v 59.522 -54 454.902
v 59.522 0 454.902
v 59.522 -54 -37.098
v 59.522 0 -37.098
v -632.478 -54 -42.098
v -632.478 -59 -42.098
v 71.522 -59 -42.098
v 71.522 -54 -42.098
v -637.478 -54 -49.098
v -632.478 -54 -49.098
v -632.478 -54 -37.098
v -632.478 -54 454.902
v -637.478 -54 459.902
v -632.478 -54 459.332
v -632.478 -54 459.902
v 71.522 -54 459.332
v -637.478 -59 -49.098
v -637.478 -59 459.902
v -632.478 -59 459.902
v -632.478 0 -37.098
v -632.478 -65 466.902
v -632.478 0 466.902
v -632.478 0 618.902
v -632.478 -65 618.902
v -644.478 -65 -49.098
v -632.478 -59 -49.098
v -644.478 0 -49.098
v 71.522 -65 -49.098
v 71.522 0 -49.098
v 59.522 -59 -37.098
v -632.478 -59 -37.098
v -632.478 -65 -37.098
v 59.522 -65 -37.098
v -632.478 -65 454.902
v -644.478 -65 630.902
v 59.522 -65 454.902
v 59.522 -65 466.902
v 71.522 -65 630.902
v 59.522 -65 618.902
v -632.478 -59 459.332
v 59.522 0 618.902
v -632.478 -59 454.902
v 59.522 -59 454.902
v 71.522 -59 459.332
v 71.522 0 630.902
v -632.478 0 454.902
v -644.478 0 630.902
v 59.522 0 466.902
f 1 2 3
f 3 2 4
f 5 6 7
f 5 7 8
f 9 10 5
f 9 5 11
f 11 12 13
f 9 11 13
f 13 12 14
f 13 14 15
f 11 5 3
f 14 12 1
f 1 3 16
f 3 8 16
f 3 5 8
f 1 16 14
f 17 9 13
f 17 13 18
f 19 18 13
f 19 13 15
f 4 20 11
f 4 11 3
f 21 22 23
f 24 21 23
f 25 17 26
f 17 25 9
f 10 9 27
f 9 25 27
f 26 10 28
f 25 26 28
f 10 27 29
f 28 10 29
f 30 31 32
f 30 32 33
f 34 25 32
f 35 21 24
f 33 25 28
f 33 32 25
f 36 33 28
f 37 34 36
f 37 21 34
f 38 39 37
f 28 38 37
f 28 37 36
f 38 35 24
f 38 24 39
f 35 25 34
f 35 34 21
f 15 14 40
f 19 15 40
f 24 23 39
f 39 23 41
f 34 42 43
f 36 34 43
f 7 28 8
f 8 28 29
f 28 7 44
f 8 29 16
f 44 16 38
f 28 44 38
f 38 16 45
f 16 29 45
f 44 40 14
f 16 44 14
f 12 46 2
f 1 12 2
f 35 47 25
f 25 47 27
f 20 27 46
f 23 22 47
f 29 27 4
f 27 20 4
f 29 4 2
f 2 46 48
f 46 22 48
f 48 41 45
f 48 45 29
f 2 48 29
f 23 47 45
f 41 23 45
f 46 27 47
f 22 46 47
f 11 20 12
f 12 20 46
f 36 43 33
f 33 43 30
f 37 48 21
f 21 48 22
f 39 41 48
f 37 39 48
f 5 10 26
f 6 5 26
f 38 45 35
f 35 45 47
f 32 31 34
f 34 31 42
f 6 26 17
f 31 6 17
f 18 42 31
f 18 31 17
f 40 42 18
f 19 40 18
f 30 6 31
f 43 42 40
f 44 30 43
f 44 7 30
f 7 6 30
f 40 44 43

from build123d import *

# Parameters (mm, degrees)
F0_W     = 692
F0_H     = 12
F1_DEPTH = 65
F2_W     = 5
F2_H     = 5
F3_DEPTH = 709
F4_W     = 5
F4_H     = 4.429847
F5_DEPTH = 709
F6_W     = 5
F6_H     = 5
F7_DEPTH = 509
F8_W     = 5
F8_H     = 492
F9_DEPTH = 12


with BuildPart() as f1:
    # F0 (on Front) → F1 (new body)
    with BuildSketch(Plane.XZ):
        Polygon((59.521648, 466.902112), (-632.478352, 466.902112), (-636.478352, 466.902112), (-636.478352, 454.902112), (-632.478352, 454.902112), (59.521648, 454.902112), (63.521648, 454.902112), (63.521648, 466.902112), align=None)
        Polygon((-634.478352, 630.902112), (-644.478352, 630.902112), (-644.478352, -49.097888), (-632.478352, -49.097888), (-632.478352, -37.097888), (-632.478352, 454.902112), (-636.478352, 454.902112), (-636.478352, 466.902112), (-632.478352, 466.902112), (-632.478352, 618.902112), (-632.478352, 630.902112), align=None)
        with Locations((-286.478352, 624.902112)):
            Rectangle(F0_W, F0_H)
        Polygon((71.521648, 630.902112), (59.521648, 630.902112), (59.521648, 618.902112), (59.521648, 466.902112), (63.521648, 466.902112), (63.521648, 454.902112), (59.521648, 454.902112), (59.521648, -37.097888), (59.521648, -49.097888), (71.521648, -49.097888), align=None)
        with Locations((-286.478352, -43.097888)):
            Rectangle(F0_W, F0_H)
    extrude(amount=F1_DEPTH)

    # F2 (on face) → F3 (cut)
    with BuildSketch(Plane.YZ.offset(71.521648)):
        with Locations((-56.5, -39.597888)):
            Rectangle(F2_W, F2_H)
    extrude(amount=-F3_DEPTH, mode=Mode.SUBTRACT)

    # F4 (on face) → F5 (cut)
    with BuildSketch(Plane.YZ.offset(71.521648)):
        with Locations((-56.5, 457.117035)):
            Rectangle(F4_W, F4_H)
    extrude(amount=-F5_DEPTH, mode=Mode.SUBTRACT)

    # F6 (on face) → F7 (cut)
    with BuildSketch(Plane(origin=(0, 0, -49.097888), x_dir=(1, 0, 0), z_dir=(0, 0, -1))):
        with Locations((-634.978352, 56.5)):
            Rectangle(F6_W, F6_H)
    extrude(amount=-F7_DEPTH, mode=Mode.SUBTRACT)

    # F8 (on face) → F9 (cut)
    with BuildSketch(Plane.YZ.offset(71.521648)):
        with Locations((-56.5, 208.902112)):
            Rectangle(F8_W, F8_H)
    extrude(amount=-F9_DEPTH, mode=Mode.SUBTRACT)


solid = f1.part
